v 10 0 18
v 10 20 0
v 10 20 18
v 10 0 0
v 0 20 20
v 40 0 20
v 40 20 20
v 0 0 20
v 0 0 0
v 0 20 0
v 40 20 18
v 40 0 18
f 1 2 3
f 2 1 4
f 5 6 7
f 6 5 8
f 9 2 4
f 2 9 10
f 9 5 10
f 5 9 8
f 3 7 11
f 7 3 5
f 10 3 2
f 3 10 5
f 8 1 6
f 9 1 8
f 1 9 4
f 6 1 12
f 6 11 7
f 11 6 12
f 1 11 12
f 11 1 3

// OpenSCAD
// Two parts with known answers, for calibrating check_slicing.py.
//
// A check that only ever returns "fine" is indistinguishable from a check that
// is broken, and a slicer's stability detector is a black box that could change
// between releases. So there is a part it must complain about and a part it must
// not, and `check_slicing.py --calibrate` asks it both questions.
//
// They differ only in how the reach is made: the same 30 mm of overhang, once
// hanging in air and once drafted at 40 degrees from vertical.
which = "bad";   // "bad" needs support, "good" does not

if (which == "bad") {
    cube([10, 20, 20]);
    translate([10, 0, 18]) cube([30, 20, 2]);   // straight out into thin air
} else {
    hull() {
        cube([10, 20, 2]);
        translate([0, 0, 18]) cube([40, 20, 2]);
    }
}
